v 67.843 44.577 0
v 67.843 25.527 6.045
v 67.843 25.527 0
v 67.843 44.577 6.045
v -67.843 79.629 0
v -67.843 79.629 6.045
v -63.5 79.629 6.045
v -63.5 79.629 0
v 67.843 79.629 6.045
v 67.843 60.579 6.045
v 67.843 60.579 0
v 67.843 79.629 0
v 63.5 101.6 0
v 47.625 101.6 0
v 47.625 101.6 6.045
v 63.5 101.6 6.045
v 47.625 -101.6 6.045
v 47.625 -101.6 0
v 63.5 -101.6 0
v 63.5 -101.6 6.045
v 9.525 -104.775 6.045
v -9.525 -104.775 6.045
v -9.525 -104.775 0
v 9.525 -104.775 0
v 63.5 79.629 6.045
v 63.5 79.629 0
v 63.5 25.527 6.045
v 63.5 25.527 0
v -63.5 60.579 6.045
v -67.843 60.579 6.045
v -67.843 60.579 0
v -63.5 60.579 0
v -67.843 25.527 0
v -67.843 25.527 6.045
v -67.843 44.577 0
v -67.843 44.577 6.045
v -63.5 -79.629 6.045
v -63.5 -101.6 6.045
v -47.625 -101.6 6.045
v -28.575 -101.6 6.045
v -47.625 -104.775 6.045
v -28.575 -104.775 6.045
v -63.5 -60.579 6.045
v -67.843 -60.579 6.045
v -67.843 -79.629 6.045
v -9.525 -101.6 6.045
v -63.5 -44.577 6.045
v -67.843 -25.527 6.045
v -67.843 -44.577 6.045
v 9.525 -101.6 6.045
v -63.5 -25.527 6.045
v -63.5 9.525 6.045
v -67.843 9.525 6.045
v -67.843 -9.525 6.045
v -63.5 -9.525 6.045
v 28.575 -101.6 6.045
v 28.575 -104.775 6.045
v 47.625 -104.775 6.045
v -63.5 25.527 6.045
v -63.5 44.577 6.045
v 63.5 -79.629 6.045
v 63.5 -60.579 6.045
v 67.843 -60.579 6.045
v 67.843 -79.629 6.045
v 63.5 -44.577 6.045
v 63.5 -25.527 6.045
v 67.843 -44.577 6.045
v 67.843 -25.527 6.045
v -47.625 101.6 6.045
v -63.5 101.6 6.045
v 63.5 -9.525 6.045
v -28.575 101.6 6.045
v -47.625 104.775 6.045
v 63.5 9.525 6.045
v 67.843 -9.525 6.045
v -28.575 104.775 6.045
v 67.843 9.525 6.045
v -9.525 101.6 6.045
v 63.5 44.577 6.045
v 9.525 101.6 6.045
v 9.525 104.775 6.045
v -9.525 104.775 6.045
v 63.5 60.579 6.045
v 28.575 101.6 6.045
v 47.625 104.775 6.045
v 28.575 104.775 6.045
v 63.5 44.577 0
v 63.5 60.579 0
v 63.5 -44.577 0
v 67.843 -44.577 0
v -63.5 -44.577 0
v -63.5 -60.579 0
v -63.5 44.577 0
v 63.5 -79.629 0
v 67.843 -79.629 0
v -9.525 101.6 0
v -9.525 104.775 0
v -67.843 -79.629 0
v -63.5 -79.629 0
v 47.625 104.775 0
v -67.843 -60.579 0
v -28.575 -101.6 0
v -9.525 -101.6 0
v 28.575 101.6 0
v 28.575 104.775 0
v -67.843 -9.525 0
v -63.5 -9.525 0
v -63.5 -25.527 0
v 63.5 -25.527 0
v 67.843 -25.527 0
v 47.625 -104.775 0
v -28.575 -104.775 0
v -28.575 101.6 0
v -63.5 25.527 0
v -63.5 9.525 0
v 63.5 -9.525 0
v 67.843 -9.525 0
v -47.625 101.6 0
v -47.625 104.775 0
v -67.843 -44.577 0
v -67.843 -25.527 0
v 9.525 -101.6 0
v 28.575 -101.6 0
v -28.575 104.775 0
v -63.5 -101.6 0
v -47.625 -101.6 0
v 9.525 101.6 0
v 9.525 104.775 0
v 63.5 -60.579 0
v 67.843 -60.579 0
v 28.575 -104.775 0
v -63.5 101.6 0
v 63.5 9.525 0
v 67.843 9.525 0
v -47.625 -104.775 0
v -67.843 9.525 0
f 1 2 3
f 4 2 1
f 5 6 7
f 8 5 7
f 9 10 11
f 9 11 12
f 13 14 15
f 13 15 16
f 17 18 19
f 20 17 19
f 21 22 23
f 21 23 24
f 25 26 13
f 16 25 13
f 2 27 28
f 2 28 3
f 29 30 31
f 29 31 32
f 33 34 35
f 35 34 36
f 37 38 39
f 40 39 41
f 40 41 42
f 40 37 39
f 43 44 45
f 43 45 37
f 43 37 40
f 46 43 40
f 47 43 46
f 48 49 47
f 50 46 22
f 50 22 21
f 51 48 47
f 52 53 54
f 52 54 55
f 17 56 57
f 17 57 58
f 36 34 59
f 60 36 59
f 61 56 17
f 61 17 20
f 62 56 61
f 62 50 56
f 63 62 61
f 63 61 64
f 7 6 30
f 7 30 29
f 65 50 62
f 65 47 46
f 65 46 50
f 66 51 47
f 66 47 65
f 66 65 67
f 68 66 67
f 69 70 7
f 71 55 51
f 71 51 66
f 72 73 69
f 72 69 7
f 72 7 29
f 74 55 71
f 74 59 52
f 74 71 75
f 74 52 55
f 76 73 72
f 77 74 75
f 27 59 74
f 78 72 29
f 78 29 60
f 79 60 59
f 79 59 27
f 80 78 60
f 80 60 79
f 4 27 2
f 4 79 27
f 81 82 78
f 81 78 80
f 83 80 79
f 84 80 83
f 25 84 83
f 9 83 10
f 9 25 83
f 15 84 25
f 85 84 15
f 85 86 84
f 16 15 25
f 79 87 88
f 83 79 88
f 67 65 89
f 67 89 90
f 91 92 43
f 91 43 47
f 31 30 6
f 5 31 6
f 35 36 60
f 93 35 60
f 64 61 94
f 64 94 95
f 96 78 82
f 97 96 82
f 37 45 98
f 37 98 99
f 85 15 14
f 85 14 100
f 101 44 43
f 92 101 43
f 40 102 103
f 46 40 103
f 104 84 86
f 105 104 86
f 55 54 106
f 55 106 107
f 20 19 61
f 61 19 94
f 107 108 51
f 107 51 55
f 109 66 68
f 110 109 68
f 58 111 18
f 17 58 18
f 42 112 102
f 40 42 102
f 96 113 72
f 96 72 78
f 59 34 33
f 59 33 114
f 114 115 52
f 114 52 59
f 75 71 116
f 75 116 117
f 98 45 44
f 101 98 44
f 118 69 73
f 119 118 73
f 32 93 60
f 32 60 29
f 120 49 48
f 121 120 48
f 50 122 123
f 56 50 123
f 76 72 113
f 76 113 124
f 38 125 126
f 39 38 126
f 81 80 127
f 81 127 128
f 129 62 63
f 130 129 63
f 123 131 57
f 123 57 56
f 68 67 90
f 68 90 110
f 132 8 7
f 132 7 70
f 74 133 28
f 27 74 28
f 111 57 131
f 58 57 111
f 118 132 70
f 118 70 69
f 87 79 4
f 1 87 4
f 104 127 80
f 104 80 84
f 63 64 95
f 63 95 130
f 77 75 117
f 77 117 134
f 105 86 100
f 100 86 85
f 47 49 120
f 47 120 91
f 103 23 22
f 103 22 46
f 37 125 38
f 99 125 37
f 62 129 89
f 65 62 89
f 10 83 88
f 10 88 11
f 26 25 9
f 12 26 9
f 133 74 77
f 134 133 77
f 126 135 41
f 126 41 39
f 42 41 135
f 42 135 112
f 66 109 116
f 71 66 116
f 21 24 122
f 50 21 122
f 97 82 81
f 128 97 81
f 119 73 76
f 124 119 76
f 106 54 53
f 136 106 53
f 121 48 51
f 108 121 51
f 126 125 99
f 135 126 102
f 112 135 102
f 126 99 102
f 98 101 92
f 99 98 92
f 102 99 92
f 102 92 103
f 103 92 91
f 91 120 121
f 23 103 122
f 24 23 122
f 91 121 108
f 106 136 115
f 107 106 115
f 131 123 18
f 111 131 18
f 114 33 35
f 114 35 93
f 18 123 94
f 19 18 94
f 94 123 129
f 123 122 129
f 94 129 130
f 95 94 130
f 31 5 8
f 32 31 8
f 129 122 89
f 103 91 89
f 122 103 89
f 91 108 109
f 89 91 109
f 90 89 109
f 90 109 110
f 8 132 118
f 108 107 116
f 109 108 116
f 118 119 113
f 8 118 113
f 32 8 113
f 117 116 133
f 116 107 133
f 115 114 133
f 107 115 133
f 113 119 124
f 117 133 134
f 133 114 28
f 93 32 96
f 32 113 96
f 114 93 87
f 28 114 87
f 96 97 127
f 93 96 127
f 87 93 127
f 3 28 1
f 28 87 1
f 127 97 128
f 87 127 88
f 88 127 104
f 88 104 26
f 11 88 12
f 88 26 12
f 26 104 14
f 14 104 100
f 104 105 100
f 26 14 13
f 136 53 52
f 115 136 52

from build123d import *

# Parameters (mm, degrees)
SKETCH1_W           = 127
SKETCH1_H           = 203.2
BOSS_EXTRUDE1_DEPTH = 6.0452
SKETCH2_W           = 19.05
SKETCH2_H           = 6.35
BOSS_EXTRUDE2_DEPTH = 6.0452
SKETCH3_W           = 8.6868
SKETCH3_H           = 19.05
BOSS_EXTRUDE3_DEPTH = 6.0452


with BuildPart() as part:
    # Sketch1 → Boss-Extrude1 (new body)
    with BuildSketch(Plane.XY):
        Rectangle(SKETCH1_W, SKETCH1_H)
    extrude(amount=BOSS_EXTRUDE1_DEPTH)

    # Sketch2 → Boss-Extrude2 (add)
    with BuildSketch(Plane.XY.offset(6.0452)):
        with Locations((0, 101.6)):
            Rectangle(SKETCH2_W, SKETCH2_H)
        with Locations((-38.1, 101.6)):
            Rectangle(SKETCH2_W, SKETCH2_H)
        with Locations((38.1, 101.6)):
            Rectangle(SKETCH2_W, SKETCH2_H)
        with Locations((38.1, -101.6)):
            Rectangle(SKETCH2_W, SKETCH2_H)
        with Locations((-38.1, -101.6)):
            Rectangle(SKETCH2_W, SKETCH2_H)
        with Locations((0, -101.6)):
            Rectangle(SKETCH2_W, SKETCH2_H)
    extrude(amount=-BOSS_EXTRUDE2_DEPTH)

    # Sketch3 → Boss-Extrude3 (add)
    with BuildSketch(Plane.XY.offset(6.0452)):
        with Locations((63.5, 0)):
            Rectangle(SKETCH3_W, SKETCH3_H)
        with Locations((63.5, 35.052)):
            Rectangle(SKETCH3_W, SKETCH3_H)
        with Locations((63.5, 70.104)):
            Rectangle(SKETCH3_W, SKETCH3_H)
        with Locations((63.5, -70.104)):
            Rectangle(SKETCH3_W, SKETCH3_H)
        with Locations((63.5, -35.052)):
            Rectangle(SKETCH3_W, SKETCH3_H)
        with Locations((-63.5, -35.052)):
            Rectangle(SKETCH3_W, SKETCH3_H)
        with Locations((-63.5, -70.104)):
            Rectangle(SKETCH3_W, SKETCH3_H)
        with Locations((-63.5, 70.104)):
            Rectangle(SKETCH3_W, SKETCH3_H)
        with Locations((-63.5, 35.052)):
            Rectangle(SKETCH3_W, SKETCH3_H)
        with Locations((-63.5, 0)):
            Rectangle(SKETCH3_W, SKETCH3_H)
    extrude(amount=-BOSS_EXTRUDE3_DEPTH)


solid = part.part
